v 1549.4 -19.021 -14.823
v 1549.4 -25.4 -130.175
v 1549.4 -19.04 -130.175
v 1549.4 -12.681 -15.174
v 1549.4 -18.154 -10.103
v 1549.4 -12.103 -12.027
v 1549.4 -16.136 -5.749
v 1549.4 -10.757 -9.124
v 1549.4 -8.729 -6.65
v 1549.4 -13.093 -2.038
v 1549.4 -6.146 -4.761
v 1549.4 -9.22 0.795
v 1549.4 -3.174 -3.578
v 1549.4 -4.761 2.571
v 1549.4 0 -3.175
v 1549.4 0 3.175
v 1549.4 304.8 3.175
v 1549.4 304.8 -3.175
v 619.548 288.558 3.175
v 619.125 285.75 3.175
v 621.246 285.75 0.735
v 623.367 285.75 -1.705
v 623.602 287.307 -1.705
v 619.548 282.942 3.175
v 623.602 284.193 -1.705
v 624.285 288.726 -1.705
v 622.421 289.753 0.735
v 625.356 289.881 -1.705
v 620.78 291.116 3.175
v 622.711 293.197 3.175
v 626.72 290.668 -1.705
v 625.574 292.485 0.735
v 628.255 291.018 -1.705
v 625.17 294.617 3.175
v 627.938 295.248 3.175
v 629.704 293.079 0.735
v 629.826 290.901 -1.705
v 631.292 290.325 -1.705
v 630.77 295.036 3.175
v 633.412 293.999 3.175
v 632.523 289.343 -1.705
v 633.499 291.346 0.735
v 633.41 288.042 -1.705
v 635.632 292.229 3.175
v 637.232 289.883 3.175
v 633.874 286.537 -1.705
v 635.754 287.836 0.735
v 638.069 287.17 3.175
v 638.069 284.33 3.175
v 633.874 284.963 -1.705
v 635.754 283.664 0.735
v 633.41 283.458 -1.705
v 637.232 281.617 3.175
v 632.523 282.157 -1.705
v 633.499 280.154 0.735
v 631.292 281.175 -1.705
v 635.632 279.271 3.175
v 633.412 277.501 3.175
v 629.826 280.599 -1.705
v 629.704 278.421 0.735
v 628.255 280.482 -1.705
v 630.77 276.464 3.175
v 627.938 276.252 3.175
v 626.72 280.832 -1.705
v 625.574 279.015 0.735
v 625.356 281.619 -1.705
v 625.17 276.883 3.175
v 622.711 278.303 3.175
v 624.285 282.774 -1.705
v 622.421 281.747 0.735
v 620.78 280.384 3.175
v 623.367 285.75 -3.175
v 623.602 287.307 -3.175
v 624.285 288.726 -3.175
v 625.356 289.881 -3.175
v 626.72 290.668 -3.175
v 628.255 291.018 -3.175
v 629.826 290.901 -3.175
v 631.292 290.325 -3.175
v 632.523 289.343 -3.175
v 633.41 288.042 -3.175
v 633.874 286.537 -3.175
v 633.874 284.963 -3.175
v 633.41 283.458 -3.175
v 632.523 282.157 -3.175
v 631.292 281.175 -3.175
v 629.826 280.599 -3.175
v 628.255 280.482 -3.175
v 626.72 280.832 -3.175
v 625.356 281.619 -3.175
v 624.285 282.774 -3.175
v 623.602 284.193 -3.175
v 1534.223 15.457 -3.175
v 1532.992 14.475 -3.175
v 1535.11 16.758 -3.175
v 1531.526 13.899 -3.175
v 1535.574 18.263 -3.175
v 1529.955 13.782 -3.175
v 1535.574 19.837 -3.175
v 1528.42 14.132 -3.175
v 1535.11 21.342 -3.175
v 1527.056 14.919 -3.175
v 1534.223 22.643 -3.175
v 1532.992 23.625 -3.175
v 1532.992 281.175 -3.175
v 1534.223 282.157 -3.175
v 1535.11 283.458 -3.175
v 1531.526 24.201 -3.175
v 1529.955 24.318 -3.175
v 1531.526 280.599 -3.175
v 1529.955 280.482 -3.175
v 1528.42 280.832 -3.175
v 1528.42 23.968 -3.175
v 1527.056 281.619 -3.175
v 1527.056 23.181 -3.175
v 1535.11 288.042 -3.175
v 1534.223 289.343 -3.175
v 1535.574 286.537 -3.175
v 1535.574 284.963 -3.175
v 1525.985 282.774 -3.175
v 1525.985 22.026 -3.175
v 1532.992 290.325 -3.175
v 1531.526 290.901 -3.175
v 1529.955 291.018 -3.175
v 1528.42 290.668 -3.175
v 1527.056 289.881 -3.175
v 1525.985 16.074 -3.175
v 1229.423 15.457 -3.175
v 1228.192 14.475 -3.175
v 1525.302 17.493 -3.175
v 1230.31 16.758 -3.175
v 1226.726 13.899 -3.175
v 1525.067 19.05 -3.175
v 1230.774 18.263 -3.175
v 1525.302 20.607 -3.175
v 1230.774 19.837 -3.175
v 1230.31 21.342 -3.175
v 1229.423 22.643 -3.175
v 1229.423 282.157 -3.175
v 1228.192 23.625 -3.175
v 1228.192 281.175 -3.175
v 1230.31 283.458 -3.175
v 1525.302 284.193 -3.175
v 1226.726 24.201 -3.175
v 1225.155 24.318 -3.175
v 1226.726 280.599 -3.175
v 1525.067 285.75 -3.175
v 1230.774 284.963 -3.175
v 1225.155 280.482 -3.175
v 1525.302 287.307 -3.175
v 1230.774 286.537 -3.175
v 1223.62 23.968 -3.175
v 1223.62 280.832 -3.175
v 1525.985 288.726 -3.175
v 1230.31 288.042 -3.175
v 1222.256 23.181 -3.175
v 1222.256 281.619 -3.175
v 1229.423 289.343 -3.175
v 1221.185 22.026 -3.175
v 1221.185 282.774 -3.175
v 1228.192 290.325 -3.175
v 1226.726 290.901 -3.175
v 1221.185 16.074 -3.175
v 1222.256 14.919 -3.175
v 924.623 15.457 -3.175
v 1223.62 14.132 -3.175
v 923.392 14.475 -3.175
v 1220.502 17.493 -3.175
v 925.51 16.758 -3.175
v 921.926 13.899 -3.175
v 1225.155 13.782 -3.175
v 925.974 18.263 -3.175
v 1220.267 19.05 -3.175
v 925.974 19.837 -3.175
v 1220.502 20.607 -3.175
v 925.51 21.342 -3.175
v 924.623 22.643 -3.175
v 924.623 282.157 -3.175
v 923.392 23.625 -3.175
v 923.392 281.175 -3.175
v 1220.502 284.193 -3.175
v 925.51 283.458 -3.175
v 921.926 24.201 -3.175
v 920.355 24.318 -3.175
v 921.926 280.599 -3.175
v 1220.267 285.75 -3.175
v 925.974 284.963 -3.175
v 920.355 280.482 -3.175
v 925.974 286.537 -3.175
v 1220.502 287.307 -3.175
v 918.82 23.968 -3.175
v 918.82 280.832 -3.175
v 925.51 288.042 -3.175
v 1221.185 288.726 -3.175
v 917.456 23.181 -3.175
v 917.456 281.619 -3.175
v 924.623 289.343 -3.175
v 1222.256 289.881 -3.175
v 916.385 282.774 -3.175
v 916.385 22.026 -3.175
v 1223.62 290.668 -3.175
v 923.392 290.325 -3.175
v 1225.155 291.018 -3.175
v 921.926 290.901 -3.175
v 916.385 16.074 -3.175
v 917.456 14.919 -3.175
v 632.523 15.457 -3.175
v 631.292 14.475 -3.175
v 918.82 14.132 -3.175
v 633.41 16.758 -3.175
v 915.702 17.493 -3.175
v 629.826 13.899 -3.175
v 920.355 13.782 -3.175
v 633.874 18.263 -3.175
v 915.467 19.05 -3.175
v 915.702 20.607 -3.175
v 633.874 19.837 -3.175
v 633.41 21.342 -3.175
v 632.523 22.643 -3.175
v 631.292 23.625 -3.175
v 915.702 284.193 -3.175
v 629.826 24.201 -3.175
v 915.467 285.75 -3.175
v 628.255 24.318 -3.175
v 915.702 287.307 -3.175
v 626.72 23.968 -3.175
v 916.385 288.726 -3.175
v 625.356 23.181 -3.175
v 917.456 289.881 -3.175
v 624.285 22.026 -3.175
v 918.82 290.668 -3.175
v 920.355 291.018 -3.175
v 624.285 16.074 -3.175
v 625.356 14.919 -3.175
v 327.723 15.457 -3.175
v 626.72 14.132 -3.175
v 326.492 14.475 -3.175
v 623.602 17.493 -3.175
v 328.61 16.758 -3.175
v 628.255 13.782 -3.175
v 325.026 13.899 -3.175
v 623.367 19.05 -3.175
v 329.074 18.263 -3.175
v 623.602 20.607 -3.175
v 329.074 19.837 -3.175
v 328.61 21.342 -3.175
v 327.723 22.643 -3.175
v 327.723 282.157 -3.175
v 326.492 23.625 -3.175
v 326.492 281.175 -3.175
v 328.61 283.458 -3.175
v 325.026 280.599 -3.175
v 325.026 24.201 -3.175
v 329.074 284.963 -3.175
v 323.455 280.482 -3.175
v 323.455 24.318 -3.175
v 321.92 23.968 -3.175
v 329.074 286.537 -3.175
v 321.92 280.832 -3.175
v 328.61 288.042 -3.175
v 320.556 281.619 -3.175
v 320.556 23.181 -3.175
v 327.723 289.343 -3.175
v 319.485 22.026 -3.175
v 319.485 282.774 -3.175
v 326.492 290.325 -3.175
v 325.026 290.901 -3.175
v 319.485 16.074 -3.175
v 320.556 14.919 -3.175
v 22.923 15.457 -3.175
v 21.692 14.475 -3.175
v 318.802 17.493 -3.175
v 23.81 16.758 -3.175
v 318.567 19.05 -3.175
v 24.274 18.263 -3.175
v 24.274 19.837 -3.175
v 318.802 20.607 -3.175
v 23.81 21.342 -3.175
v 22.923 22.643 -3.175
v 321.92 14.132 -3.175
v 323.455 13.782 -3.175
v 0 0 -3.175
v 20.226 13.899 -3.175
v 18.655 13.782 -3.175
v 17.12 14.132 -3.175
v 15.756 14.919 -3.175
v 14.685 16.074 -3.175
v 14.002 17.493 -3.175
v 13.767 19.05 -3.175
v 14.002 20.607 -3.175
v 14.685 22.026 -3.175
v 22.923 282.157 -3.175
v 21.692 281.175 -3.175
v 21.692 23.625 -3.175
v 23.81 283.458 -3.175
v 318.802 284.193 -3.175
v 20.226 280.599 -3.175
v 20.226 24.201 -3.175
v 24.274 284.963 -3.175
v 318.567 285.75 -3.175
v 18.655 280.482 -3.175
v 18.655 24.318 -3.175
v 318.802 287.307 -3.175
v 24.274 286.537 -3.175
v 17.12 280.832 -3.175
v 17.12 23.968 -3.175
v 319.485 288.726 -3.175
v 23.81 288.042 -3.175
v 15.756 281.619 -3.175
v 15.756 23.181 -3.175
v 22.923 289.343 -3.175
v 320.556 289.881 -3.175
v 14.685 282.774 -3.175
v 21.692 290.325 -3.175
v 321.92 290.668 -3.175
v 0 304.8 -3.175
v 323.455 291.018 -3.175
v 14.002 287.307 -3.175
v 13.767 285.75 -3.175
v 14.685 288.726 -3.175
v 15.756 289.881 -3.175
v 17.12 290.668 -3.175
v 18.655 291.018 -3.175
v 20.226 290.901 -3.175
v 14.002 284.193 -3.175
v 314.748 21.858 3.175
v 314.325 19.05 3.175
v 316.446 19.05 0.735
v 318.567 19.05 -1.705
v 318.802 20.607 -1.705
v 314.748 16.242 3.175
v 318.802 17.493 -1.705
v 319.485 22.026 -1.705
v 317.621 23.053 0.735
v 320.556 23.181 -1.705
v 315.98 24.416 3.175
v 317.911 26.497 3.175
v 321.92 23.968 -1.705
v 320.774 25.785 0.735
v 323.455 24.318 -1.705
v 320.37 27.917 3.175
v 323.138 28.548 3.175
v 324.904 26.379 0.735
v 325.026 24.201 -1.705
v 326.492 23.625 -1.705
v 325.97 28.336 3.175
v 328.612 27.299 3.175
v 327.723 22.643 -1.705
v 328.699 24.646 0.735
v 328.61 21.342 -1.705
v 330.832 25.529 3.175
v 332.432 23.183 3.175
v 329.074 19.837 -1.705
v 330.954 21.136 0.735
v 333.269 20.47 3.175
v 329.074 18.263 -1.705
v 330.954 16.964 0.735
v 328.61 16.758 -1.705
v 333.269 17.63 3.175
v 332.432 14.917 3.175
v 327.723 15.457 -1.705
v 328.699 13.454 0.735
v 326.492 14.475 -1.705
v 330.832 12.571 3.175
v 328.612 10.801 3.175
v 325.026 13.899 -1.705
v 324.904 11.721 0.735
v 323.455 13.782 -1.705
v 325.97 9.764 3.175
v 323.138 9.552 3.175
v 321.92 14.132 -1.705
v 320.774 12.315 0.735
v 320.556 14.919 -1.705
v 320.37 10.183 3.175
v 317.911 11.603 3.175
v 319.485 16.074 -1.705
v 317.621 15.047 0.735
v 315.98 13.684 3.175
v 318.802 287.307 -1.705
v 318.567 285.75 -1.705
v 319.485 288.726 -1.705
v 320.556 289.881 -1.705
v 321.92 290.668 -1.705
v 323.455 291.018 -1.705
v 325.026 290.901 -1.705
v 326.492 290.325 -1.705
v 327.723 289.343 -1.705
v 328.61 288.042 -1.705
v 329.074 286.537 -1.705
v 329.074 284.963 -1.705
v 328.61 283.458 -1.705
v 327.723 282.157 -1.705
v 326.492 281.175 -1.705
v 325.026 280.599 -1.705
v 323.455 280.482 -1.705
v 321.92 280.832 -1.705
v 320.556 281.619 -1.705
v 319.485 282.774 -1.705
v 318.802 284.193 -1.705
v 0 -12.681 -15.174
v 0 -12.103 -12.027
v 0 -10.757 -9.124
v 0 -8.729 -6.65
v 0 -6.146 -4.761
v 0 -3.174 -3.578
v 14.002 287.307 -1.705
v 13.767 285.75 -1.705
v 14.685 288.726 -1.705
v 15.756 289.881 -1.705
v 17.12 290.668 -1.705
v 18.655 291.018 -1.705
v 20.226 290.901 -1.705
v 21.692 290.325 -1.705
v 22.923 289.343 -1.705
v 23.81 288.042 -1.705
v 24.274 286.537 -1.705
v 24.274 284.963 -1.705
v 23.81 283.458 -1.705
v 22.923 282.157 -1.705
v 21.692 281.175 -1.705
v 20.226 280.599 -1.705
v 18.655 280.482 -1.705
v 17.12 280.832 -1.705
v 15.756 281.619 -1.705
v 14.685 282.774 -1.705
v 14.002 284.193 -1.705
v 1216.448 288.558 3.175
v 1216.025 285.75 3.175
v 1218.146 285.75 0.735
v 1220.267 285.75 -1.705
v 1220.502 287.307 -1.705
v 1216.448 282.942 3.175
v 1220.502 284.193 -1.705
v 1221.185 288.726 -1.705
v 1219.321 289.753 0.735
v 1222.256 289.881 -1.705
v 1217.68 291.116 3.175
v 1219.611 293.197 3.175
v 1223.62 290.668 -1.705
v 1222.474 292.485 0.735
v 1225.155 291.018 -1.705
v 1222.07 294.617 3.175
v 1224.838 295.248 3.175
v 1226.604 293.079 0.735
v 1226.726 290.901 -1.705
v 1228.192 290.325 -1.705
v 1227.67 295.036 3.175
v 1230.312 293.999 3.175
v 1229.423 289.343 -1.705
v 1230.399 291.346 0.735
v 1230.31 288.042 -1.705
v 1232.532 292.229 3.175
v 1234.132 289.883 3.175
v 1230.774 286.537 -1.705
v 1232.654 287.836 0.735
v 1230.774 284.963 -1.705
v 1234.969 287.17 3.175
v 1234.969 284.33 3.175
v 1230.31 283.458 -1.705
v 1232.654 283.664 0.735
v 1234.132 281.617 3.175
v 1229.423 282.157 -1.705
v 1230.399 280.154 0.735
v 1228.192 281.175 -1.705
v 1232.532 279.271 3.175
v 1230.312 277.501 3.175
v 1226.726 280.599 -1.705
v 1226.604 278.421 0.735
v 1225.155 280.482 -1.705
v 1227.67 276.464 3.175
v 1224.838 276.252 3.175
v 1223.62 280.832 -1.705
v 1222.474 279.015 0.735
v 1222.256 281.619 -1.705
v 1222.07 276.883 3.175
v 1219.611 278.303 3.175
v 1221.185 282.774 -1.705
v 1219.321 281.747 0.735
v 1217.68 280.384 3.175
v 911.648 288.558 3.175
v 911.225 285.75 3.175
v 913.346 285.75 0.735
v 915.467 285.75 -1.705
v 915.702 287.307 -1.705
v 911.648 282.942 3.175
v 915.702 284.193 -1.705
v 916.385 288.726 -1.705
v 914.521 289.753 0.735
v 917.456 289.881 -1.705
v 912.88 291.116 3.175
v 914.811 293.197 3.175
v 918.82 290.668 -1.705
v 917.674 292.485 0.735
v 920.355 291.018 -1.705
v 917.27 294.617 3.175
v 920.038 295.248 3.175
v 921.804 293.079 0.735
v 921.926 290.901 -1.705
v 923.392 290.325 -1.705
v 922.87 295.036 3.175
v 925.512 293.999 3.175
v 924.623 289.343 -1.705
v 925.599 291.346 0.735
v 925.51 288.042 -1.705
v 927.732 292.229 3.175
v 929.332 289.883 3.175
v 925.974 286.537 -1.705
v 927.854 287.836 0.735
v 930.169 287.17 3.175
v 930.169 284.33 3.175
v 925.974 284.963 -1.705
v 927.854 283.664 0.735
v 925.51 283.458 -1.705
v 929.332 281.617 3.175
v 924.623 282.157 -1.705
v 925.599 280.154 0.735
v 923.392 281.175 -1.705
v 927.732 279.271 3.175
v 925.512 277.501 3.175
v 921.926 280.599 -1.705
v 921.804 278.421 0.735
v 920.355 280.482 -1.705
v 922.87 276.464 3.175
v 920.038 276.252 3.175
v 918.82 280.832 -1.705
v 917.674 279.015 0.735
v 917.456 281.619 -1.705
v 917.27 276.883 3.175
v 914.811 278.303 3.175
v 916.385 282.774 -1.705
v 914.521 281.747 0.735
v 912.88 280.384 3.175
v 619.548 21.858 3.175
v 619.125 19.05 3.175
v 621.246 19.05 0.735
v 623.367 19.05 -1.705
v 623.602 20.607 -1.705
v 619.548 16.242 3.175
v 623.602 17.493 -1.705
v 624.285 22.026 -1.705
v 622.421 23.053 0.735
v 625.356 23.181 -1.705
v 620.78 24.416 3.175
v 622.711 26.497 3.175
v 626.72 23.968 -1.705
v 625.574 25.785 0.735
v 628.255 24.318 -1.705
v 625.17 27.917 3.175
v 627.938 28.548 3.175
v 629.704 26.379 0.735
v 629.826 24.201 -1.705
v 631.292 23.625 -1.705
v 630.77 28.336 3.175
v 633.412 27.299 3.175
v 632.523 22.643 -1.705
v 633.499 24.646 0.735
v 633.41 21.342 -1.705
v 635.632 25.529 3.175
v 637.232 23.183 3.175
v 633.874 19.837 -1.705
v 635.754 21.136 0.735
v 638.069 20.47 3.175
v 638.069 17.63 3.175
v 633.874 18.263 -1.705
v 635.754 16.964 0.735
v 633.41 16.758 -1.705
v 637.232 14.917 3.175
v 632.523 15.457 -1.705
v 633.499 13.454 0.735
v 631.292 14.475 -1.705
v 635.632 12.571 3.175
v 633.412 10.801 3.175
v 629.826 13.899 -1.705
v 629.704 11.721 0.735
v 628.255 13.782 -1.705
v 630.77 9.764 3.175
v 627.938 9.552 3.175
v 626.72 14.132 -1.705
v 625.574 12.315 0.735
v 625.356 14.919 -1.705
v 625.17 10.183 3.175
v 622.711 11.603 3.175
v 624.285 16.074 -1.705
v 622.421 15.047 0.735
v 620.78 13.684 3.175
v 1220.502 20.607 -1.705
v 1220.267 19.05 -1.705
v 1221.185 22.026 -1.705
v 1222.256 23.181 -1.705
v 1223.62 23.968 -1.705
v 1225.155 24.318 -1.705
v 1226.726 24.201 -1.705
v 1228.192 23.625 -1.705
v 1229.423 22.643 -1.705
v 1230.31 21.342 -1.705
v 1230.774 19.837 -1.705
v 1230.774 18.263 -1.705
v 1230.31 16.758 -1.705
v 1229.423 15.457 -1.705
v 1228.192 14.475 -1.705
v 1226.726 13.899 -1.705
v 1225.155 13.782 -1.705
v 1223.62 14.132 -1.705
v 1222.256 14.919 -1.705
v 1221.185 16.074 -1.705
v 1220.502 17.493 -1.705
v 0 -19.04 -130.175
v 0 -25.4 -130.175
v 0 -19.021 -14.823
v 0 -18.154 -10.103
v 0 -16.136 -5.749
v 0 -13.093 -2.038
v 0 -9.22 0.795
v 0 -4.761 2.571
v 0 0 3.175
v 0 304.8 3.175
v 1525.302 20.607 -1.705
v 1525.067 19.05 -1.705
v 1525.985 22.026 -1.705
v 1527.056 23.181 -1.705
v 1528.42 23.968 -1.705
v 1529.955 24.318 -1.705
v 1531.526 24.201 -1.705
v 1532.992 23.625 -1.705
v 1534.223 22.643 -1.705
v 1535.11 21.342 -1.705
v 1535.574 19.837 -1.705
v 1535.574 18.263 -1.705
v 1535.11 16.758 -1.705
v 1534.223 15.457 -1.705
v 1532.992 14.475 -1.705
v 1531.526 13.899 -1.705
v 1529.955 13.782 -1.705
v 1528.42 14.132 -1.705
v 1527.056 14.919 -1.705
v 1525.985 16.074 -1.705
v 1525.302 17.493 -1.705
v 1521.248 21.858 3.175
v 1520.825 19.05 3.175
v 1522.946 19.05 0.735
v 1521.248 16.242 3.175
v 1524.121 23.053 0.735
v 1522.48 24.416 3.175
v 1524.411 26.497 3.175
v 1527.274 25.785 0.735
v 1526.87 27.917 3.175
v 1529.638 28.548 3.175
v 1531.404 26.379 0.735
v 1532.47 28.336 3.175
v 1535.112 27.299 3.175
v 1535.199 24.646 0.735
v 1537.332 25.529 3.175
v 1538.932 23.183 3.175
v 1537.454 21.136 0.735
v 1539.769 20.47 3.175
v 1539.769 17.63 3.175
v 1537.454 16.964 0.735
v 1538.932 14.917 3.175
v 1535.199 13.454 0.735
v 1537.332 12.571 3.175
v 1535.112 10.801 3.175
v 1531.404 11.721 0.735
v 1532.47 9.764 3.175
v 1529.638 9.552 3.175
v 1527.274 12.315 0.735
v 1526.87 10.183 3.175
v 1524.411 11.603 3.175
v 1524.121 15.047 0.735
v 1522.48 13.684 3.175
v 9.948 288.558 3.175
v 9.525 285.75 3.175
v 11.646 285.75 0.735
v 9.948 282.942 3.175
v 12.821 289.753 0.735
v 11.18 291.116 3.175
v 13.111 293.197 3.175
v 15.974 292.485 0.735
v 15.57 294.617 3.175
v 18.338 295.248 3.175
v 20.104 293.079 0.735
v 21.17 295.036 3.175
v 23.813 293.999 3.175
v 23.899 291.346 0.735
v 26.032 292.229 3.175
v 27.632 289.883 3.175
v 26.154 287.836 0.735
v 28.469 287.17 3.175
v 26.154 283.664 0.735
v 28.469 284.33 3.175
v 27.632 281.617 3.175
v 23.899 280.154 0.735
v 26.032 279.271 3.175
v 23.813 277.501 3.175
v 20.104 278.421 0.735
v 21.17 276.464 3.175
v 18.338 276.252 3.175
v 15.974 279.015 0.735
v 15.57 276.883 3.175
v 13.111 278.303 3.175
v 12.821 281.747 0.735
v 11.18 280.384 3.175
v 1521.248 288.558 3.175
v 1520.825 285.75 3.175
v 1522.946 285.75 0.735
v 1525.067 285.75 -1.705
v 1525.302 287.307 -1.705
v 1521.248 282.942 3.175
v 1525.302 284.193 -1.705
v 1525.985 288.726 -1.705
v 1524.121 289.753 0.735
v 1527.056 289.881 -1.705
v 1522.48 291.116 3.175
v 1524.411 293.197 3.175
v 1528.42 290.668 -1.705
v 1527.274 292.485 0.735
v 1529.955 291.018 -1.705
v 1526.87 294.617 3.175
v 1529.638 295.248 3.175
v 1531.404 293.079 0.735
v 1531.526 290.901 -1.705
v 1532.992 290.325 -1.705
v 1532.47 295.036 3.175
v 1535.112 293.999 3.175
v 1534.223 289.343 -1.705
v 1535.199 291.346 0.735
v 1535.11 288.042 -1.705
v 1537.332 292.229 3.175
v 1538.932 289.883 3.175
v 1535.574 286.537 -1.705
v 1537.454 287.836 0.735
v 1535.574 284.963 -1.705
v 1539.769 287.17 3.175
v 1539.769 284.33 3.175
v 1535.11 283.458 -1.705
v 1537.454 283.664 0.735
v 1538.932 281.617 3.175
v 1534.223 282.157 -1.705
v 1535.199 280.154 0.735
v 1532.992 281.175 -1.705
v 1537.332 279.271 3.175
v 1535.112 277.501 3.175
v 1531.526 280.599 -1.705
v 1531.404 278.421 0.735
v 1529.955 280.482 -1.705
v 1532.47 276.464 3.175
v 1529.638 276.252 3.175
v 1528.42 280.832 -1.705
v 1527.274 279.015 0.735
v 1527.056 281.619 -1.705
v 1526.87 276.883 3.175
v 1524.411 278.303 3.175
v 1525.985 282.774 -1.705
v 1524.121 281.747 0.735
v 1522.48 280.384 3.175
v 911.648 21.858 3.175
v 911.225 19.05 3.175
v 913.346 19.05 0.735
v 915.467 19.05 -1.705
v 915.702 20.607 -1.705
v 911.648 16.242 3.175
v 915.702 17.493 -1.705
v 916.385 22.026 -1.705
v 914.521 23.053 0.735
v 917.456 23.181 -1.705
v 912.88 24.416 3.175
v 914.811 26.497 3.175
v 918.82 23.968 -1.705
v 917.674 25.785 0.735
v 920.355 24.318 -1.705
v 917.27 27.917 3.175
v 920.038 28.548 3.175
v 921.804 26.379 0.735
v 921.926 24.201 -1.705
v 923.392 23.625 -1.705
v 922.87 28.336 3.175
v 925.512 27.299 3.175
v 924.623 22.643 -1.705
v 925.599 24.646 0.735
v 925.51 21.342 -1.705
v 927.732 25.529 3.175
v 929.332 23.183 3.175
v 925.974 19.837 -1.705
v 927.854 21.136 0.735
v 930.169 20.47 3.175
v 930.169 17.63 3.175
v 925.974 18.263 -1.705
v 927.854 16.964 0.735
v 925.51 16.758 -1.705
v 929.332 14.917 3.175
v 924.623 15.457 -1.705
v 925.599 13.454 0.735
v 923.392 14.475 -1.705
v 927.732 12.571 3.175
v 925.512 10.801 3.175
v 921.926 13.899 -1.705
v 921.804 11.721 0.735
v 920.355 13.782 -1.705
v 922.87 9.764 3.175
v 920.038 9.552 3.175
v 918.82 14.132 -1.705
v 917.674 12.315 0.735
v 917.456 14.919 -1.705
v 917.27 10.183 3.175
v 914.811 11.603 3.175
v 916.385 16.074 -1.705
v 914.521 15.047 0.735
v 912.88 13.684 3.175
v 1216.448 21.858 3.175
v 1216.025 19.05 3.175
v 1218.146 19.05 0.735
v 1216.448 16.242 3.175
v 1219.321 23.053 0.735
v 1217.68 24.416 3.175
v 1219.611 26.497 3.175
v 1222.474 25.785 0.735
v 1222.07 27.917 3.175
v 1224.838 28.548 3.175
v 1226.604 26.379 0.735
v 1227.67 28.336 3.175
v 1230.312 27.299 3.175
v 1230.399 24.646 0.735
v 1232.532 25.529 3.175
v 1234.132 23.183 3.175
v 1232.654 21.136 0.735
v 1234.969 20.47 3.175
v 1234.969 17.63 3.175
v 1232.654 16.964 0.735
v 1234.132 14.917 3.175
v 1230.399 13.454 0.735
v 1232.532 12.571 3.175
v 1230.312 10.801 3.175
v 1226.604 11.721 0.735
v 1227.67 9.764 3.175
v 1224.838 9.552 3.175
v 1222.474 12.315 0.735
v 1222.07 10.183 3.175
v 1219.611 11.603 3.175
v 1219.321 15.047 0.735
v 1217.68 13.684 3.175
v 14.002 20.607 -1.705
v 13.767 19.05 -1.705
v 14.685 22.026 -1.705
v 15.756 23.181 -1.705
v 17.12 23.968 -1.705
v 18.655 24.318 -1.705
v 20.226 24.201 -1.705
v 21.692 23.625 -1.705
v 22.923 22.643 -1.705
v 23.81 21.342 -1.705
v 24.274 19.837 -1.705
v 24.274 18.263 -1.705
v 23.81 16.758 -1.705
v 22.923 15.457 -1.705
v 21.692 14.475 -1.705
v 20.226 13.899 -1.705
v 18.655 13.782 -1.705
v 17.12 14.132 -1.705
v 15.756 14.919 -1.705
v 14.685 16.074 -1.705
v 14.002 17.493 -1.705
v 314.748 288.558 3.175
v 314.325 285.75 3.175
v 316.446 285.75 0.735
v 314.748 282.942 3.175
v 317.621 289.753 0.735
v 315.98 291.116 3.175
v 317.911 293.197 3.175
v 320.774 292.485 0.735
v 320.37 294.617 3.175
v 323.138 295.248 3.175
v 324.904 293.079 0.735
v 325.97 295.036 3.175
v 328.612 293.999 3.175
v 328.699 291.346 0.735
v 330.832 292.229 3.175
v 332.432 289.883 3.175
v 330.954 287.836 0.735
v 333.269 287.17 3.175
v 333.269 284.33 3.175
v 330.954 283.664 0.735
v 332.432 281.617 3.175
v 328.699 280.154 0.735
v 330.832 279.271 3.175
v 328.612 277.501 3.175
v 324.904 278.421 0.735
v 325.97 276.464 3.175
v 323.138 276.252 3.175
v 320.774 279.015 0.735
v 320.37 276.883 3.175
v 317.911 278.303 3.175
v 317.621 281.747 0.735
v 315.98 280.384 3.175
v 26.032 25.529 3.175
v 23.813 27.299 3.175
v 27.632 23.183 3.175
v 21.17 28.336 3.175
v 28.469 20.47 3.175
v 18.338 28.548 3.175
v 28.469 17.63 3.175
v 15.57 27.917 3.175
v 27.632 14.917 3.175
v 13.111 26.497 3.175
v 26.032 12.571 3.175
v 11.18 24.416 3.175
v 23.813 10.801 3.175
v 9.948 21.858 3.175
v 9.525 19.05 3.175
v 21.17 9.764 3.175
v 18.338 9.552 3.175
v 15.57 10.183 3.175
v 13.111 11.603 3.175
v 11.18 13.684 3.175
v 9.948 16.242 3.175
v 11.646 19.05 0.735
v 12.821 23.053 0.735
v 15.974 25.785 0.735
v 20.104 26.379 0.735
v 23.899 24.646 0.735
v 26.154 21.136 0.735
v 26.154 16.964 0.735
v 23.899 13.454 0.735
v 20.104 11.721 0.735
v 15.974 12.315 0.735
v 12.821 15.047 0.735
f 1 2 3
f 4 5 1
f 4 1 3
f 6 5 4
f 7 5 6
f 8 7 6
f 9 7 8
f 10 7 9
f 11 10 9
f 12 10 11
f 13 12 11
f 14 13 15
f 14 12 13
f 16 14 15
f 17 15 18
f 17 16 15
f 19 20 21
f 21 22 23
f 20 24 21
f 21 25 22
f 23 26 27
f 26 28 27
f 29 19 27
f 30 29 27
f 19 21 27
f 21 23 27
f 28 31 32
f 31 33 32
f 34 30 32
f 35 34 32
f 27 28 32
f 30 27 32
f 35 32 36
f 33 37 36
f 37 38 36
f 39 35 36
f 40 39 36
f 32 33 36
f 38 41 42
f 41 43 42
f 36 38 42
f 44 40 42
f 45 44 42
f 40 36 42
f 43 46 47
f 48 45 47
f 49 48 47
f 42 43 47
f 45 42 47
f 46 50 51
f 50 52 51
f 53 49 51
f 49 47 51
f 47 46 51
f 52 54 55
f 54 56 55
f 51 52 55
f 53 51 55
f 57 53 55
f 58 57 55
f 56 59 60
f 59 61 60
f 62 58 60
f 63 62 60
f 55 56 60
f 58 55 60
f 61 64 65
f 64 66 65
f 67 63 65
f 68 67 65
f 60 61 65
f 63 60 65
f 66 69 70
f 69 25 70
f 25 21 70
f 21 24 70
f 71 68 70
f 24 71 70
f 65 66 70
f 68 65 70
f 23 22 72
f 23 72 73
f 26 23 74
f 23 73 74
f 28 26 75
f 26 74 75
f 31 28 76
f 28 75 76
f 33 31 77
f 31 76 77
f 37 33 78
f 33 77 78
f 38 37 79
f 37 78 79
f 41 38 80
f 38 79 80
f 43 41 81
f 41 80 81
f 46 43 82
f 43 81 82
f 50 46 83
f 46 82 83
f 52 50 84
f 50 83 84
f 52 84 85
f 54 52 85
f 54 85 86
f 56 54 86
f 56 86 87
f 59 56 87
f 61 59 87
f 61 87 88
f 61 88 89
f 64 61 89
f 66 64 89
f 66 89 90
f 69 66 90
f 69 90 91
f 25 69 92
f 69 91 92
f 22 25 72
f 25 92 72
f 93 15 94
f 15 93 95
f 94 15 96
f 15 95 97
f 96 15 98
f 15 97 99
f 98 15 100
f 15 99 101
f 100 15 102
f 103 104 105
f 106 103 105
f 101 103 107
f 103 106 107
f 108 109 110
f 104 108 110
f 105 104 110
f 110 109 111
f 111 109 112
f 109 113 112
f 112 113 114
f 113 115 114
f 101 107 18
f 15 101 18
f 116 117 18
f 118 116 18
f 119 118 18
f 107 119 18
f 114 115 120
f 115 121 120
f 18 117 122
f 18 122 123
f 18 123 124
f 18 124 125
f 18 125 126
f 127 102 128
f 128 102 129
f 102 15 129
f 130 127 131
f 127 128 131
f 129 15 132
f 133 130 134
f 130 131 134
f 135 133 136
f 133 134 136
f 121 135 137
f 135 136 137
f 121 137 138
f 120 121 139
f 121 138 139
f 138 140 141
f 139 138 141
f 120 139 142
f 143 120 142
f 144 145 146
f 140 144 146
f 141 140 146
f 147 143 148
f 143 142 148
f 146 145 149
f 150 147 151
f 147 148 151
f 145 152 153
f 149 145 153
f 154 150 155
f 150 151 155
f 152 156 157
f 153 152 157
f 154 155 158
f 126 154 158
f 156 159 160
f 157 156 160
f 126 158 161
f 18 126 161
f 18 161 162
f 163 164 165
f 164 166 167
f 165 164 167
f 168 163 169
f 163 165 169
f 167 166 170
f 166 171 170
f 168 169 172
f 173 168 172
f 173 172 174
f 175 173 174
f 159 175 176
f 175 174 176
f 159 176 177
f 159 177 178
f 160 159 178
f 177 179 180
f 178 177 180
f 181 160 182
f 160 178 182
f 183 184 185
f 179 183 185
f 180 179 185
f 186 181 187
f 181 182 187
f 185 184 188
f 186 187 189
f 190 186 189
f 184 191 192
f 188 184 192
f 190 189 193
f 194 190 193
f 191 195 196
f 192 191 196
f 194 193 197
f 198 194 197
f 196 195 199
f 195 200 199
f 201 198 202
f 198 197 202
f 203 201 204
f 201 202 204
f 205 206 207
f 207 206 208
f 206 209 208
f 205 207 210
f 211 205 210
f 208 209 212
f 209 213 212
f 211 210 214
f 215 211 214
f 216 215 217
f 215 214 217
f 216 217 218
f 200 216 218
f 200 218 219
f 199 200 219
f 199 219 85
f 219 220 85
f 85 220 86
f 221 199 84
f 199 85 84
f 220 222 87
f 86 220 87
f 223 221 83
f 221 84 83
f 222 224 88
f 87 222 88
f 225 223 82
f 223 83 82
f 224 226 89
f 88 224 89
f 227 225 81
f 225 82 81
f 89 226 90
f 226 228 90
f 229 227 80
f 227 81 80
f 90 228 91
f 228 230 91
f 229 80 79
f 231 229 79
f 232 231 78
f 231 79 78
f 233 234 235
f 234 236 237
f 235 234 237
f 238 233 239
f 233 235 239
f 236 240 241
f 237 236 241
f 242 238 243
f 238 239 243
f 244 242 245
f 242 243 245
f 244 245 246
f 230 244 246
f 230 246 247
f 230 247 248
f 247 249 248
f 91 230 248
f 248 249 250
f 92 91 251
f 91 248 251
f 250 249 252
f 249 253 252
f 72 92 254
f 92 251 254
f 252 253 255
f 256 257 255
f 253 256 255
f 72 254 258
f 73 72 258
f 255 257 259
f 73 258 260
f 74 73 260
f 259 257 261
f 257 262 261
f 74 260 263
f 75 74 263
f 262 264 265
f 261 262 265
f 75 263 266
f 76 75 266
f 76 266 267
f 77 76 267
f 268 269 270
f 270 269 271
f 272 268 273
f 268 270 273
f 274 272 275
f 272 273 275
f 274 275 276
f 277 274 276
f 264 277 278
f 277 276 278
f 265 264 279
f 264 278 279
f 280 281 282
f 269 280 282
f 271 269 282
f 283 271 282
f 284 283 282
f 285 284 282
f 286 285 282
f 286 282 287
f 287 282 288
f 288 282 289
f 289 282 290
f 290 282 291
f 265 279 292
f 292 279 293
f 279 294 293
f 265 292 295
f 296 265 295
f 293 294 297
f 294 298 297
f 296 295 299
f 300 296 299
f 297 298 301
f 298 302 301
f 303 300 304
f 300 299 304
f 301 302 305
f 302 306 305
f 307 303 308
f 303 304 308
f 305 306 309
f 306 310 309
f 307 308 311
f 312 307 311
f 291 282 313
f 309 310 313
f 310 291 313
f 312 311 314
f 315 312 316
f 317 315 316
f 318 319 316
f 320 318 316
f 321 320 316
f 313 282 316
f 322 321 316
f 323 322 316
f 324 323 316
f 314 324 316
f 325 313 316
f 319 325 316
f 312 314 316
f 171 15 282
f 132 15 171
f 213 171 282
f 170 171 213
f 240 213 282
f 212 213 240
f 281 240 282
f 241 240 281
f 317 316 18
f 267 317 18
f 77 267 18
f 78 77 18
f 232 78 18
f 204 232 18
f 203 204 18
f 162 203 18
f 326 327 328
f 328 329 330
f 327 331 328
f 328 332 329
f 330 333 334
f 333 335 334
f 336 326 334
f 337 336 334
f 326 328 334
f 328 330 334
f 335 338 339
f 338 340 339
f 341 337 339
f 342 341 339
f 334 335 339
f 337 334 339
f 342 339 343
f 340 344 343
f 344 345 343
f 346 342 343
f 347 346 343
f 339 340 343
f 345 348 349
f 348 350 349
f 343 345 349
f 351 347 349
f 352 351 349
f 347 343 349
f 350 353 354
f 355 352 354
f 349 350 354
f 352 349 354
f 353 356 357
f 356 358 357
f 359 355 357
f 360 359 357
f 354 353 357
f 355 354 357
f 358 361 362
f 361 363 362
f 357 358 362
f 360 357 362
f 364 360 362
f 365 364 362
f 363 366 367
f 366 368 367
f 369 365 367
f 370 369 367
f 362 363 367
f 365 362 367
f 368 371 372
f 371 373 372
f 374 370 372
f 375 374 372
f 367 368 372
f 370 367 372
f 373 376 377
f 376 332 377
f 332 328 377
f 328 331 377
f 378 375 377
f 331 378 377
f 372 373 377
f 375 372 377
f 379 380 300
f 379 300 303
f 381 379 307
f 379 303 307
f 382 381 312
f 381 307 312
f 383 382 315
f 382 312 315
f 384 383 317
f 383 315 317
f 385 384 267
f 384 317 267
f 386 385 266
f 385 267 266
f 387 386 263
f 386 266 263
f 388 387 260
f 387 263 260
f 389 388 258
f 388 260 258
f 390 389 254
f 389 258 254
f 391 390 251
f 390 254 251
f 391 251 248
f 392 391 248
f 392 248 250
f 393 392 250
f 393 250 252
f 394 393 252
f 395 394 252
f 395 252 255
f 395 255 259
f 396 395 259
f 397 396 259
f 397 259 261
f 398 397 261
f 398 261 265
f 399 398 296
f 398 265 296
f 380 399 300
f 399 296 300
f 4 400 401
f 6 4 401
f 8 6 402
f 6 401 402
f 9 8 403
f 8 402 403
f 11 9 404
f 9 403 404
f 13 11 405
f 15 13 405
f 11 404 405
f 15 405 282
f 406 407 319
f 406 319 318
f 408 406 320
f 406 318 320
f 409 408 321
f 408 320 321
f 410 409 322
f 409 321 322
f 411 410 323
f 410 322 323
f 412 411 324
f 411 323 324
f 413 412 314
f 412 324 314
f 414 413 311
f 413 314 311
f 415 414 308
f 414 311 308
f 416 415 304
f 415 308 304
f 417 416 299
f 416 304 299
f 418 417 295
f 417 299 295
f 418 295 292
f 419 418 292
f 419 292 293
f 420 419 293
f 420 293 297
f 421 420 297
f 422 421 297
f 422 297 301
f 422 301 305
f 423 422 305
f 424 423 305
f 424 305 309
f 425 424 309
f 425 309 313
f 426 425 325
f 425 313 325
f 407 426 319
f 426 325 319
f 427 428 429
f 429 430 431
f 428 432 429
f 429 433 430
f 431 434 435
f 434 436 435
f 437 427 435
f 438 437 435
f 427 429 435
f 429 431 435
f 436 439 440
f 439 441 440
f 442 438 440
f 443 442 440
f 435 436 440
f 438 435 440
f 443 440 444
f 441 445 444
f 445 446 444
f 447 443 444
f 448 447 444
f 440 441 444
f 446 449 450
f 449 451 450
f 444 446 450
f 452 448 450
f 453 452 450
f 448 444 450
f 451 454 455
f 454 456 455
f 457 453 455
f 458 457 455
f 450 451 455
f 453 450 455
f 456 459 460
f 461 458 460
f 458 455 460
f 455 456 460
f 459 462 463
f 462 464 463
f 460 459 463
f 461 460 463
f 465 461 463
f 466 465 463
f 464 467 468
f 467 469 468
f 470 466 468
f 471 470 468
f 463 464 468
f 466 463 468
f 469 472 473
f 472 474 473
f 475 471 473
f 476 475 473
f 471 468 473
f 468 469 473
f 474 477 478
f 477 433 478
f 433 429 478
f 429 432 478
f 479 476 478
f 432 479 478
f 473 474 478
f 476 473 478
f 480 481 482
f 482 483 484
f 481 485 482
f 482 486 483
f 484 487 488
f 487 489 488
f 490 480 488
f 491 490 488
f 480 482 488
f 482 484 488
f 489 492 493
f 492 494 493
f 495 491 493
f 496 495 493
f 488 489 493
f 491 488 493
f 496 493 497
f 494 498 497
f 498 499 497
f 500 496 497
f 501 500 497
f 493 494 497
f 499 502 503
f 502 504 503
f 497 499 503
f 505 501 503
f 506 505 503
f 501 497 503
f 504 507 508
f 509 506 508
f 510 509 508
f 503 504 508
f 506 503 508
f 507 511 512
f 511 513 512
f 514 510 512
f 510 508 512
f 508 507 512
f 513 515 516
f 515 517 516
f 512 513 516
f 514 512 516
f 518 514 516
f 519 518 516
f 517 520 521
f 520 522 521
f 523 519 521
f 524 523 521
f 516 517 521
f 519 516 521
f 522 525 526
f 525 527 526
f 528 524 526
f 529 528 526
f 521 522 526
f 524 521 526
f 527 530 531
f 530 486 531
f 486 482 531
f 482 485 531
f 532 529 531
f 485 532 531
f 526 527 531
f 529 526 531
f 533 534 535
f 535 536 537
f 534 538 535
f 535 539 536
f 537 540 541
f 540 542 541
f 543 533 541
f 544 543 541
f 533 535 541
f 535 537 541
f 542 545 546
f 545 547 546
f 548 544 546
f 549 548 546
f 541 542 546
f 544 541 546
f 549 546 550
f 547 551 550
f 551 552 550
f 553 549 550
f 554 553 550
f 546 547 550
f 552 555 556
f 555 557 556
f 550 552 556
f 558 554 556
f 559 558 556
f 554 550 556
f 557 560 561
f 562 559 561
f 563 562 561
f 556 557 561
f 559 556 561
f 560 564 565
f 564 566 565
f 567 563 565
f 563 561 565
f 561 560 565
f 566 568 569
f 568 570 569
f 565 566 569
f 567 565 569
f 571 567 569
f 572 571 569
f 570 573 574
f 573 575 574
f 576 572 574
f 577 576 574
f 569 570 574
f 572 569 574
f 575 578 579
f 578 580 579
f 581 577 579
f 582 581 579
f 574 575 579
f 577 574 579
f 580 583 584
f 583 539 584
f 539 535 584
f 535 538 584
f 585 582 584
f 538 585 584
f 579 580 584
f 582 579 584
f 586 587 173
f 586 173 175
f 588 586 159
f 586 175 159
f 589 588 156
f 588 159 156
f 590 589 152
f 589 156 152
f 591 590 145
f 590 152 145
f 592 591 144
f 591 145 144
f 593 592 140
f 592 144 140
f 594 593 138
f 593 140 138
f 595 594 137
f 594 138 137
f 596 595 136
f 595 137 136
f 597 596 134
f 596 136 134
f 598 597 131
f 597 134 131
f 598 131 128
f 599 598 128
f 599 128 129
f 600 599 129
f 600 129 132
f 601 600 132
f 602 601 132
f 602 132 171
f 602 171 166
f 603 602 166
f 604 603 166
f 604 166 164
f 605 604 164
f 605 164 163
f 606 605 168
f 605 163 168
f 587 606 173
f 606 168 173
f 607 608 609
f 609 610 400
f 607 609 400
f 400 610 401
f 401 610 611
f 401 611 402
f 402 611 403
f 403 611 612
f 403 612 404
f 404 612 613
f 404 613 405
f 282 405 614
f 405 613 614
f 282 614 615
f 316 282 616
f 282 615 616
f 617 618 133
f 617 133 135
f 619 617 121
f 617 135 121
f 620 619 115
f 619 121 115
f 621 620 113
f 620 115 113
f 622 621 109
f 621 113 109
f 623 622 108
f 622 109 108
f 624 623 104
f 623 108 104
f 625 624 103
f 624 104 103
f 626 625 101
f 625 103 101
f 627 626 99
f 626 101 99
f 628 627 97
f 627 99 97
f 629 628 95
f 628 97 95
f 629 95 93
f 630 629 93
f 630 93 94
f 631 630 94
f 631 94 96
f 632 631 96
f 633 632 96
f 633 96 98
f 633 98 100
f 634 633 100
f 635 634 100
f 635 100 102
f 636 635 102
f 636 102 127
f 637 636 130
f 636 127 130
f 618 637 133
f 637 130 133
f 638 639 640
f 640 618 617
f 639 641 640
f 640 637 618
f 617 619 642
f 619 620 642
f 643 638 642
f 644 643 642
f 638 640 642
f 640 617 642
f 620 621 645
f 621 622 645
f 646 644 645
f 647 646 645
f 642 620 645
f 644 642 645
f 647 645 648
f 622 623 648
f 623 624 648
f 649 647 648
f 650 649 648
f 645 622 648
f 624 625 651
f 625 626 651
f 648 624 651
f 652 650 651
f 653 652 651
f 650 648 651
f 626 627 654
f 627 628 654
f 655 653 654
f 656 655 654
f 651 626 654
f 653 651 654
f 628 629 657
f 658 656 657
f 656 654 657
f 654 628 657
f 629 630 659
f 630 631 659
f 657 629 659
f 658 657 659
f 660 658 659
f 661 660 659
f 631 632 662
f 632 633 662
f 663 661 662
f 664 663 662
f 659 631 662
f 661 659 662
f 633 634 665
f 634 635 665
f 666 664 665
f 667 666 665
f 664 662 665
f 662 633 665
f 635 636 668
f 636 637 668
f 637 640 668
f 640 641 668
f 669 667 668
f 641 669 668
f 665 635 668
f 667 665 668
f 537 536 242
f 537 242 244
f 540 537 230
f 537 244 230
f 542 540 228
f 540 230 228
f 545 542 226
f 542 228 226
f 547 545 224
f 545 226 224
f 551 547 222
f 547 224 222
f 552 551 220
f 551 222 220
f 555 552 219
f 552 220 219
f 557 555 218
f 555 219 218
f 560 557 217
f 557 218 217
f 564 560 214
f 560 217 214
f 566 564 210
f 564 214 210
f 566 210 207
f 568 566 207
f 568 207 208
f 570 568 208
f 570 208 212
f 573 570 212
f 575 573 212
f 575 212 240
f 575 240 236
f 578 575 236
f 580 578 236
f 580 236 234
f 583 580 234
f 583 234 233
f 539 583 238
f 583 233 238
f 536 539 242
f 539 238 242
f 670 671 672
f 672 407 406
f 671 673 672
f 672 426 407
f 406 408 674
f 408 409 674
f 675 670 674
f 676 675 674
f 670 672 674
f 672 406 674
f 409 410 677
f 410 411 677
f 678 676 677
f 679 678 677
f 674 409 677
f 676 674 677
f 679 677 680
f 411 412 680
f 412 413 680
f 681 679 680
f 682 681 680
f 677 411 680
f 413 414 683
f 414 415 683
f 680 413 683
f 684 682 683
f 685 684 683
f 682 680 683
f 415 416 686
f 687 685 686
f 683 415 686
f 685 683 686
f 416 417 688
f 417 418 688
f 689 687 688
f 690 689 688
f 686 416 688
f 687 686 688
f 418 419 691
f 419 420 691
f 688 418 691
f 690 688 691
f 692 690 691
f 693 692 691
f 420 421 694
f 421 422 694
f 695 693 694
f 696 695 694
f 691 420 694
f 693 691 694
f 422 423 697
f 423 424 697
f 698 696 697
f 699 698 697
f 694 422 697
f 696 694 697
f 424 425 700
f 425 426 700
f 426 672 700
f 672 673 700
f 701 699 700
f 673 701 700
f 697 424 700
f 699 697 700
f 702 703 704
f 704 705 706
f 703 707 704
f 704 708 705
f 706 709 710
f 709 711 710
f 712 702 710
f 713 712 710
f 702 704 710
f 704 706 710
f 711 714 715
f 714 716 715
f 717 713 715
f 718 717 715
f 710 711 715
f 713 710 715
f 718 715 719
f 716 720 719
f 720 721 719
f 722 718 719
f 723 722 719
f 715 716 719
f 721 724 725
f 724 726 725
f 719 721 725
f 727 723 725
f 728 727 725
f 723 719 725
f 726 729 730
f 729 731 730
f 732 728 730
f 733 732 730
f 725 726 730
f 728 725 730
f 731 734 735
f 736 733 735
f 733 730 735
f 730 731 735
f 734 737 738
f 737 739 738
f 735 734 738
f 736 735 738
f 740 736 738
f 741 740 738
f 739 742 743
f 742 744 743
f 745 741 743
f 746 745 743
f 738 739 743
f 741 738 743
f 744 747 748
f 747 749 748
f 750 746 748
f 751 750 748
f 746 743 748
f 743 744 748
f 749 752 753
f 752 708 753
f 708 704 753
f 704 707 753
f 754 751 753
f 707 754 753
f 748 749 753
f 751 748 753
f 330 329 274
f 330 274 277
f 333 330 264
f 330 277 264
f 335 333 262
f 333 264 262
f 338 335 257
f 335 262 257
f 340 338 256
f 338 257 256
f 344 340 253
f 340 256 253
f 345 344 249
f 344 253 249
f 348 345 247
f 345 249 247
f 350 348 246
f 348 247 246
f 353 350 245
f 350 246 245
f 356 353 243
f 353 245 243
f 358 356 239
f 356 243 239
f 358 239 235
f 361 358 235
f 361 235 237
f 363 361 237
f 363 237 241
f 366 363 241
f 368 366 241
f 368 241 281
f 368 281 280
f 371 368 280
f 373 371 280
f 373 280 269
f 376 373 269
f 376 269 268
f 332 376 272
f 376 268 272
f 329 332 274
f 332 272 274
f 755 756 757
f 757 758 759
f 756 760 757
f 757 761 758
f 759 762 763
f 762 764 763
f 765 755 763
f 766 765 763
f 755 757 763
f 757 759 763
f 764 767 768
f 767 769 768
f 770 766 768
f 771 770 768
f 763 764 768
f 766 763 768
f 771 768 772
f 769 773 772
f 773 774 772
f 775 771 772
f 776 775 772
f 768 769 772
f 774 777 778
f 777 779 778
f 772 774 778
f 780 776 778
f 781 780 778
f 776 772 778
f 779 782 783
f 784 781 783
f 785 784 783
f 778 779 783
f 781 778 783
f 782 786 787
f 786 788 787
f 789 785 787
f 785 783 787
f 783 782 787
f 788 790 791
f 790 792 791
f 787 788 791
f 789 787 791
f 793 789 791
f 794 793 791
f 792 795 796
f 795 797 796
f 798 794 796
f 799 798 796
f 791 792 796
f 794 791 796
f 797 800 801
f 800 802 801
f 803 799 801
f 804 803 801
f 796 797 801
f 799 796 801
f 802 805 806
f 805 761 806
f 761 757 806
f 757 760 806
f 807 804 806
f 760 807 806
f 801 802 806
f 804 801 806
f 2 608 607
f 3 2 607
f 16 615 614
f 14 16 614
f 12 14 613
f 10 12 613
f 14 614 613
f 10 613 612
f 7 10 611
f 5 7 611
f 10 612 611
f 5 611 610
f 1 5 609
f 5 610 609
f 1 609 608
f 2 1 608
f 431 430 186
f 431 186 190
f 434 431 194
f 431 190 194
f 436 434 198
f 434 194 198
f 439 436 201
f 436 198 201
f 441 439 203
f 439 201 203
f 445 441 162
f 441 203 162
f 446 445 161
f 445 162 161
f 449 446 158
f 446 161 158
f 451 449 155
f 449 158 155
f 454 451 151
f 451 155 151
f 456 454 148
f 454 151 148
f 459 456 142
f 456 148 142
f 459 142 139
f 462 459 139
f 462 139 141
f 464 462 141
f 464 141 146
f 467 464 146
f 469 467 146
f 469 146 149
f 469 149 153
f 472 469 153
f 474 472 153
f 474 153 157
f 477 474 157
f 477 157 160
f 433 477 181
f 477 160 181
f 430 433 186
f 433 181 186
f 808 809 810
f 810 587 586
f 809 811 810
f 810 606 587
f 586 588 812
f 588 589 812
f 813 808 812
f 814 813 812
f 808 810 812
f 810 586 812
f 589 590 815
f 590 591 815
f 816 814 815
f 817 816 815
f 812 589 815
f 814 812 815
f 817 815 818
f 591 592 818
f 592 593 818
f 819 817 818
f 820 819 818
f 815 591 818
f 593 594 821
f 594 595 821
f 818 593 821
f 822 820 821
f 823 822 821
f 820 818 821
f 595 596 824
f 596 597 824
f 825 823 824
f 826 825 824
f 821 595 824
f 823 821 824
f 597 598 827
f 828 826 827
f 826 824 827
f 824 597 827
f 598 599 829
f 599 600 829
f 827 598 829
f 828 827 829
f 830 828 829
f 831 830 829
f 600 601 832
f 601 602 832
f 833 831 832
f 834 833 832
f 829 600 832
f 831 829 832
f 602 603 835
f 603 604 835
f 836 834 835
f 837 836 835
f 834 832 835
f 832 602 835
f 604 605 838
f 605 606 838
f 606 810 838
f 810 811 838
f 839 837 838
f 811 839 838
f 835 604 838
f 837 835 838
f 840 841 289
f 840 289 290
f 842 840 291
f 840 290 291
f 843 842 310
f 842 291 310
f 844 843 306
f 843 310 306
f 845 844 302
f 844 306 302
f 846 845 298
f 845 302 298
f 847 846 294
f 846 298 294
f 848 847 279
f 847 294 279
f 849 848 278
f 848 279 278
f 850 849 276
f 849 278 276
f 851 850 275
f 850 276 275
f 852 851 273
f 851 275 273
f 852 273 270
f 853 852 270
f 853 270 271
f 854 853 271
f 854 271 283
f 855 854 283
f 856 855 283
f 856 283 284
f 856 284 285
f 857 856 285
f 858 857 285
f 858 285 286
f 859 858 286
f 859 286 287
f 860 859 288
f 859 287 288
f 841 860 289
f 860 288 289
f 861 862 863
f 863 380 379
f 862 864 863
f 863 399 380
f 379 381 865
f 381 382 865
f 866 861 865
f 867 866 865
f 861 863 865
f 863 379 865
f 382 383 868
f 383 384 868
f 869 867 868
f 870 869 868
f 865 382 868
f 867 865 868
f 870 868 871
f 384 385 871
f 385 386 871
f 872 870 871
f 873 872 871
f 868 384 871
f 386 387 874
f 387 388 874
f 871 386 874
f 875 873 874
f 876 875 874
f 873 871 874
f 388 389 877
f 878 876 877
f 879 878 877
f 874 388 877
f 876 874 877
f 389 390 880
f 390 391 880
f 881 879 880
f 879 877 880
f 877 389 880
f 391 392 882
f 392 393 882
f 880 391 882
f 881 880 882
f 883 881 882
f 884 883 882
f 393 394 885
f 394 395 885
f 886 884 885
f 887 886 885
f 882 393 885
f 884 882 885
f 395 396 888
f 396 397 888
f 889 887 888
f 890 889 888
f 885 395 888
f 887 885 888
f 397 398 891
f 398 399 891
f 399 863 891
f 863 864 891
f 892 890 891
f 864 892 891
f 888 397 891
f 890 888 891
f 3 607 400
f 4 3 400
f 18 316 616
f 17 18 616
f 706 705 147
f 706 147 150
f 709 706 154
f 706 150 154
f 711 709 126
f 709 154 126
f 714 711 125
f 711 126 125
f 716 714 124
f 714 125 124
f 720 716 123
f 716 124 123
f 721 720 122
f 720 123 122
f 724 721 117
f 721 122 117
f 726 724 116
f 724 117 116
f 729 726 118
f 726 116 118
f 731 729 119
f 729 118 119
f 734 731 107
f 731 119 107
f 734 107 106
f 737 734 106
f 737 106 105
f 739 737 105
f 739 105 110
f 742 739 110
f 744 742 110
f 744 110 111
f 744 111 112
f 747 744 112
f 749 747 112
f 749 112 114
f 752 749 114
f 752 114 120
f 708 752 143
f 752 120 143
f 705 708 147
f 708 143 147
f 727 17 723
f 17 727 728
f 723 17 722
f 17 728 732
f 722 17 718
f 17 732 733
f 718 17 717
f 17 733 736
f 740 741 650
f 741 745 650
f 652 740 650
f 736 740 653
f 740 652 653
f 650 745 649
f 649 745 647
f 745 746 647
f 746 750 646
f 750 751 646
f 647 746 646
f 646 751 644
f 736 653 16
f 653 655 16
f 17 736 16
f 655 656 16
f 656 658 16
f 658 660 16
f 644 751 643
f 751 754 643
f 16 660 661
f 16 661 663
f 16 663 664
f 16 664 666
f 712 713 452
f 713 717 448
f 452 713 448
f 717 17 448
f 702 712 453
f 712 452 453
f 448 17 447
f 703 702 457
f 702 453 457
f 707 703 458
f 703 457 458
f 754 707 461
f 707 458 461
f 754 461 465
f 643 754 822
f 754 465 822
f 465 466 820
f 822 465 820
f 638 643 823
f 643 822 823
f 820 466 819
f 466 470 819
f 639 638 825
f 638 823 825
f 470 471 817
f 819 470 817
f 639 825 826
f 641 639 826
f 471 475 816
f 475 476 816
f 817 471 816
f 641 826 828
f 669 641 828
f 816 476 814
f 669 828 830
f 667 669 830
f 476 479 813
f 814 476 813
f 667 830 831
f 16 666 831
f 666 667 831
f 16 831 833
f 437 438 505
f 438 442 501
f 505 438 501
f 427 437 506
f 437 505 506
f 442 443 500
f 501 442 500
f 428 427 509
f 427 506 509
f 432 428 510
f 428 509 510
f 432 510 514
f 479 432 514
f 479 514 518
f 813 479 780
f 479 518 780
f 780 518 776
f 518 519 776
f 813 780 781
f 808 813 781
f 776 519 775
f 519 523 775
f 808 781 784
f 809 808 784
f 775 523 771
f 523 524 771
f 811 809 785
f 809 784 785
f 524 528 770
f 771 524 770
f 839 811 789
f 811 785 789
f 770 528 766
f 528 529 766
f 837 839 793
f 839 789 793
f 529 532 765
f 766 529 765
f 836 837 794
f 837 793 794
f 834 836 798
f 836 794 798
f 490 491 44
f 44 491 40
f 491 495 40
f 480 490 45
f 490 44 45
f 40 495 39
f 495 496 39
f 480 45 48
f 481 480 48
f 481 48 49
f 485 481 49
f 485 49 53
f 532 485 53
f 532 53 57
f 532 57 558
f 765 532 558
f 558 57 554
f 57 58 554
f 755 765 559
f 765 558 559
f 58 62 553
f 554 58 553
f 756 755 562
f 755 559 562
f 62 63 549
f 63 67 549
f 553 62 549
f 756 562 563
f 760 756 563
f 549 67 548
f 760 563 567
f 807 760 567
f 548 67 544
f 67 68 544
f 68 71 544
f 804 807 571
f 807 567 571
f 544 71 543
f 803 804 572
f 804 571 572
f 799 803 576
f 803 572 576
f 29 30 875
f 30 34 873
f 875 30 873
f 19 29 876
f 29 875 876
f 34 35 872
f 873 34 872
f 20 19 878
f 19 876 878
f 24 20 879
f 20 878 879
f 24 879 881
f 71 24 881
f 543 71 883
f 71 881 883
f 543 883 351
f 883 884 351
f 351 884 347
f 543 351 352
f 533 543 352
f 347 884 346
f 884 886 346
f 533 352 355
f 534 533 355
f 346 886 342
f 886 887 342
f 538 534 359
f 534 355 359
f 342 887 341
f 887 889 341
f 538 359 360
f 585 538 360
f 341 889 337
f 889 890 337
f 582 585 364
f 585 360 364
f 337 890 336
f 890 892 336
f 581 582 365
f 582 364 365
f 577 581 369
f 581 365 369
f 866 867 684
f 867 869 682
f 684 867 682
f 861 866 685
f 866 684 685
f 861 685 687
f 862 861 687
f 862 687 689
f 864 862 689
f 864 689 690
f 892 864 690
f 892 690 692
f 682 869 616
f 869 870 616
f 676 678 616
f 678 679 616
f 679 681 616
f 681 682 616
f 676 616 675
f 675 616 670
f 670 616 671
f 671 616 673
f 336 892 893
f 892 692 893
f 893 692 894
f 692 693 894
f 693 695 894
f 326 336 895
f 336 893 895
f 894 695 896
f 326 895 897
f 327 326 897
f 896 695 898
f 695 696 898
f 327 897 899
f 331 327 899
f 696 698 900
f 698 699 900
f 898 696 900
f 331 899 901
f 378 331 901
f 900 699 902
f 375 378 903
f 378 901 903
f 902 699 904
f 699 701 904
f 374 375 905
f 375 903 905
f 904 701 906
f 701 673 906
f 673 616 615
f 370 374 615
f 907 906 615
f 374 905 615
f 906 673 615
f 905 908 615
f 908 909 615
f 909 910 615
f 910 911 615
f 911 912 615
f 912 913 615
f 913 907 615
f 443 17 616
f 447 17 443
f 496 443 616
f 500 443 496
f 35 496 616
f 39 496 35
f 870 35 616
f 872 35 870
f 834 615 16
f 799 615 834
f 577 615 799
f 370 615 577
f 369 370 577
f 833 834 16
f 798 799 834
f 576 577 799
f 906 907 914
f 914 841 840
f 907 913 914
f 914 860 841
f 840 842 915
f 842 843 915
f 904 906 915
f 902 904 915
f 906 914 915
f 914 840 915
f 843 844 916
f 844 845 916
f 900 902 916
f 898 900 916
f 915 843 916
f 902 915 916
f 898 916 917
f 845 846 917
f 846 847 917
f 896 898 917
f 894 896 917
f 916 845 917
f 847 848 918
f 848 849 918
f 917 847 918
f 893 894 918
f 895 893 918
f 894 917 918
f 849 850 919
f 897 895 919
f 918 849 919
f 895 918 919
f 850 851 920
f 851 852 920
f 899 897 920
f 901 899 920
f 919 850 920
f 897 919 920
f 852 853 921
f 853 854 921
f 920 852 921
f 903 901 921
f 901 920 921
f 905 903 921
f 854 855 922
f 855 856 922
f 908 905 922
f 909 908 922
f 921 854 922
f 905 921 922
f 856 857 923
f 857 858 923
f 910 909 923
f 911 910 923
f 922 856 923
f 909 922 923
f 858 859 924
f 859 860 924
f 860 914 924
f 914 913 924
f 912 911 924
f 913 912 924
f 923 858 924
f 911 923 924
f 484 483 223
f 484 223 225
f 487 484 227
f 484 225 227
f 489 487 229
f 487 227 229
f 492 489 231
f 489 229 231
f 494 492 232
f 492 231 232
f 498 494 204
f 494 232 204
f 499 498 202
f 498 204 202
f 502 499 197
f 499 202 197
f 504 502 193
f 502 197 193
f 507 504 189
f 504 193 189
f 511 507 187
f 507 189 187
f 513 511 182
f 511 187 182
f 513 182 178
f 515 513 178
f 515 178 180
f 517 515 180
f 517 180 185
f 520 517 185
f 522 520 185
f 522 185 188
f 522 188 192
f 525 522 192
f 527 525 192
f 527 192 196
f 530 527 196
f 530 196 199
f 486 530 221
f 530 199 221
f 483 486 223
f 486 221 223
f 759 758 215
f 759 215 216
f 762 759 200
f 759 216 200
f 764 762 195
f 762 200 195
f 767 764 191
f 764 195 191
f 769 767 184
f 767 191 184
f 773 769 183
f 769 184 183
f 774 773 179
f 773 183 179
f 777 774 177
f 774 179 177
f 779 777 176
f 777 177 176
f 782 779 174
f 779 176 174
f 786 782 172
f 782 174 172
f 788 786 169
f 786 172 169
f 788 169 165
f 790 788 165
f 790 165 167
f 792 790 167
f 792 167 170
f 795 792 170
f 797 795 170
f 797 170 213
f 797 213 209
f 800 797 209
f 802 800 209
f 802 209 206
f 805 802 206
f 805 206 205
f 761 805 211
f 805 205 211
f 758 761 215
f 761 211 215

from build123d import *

# Parameters (mm, degrees)
F1_DEPTH       = 1549.4
F3_D           = 10.5664
F3_DEPTH       = 406.4
F3_CSINK_D     = 19.05
F3_CSINK_ANGLE = 82


with BuildPart() as f1:
    # F0 (on Right) → F1 (new body)
    with BuildSketch(Plane.YZ):
        with BuildLine():
            ThreePointArc((0, 3.175), (-13.09321, -2.037719), (-19.020937, -14.823125))
            Line((-19.020937, -14.823125), (-25.4, -130.175))
            Line((-25.4, -130.175), (-22.220149, -130.175))
            Line((-22.220149, -130.175), (-19.040298, -130.175))
            Line((-19.040298, -130.175), (-12.680625, -15.17375))
            ThreePointArc((-12.680625, -15.17375), (-8.728806, -6.650146), (0, -3.175))
            Line((0, -3.175), (304.8, -3.175))
            Line((304.8, -3.175), (304.8, 0))
            Line((304.8, 0), (304.8, 3.175))
            Line((304.8, 3.175), (0, 3.175))
        make_face()
    extrude(amount=F1_DEPTH)

    # F3
    with Locations(Plane.XY.offset(3.175)):
        with Locations((1530.35, 285.75), (1530.35, 19.05), (1225.55, 19.05), (1225.55, 285.75), (920.75, 285.75), (920.75, 19.05), (628.65, 285.75), (628.65, 19.05), (323.85, 19.05), (323.85, 285.75), (19.05, 285.75), (19.05, 19.05)):
            CounterSinkHole(F3_D / 2, F3_CSINK_D / 2, depth=F3_DEPTH, counter_sink_angle=F3_CSINK_ANGLE)


solid = f1.part
